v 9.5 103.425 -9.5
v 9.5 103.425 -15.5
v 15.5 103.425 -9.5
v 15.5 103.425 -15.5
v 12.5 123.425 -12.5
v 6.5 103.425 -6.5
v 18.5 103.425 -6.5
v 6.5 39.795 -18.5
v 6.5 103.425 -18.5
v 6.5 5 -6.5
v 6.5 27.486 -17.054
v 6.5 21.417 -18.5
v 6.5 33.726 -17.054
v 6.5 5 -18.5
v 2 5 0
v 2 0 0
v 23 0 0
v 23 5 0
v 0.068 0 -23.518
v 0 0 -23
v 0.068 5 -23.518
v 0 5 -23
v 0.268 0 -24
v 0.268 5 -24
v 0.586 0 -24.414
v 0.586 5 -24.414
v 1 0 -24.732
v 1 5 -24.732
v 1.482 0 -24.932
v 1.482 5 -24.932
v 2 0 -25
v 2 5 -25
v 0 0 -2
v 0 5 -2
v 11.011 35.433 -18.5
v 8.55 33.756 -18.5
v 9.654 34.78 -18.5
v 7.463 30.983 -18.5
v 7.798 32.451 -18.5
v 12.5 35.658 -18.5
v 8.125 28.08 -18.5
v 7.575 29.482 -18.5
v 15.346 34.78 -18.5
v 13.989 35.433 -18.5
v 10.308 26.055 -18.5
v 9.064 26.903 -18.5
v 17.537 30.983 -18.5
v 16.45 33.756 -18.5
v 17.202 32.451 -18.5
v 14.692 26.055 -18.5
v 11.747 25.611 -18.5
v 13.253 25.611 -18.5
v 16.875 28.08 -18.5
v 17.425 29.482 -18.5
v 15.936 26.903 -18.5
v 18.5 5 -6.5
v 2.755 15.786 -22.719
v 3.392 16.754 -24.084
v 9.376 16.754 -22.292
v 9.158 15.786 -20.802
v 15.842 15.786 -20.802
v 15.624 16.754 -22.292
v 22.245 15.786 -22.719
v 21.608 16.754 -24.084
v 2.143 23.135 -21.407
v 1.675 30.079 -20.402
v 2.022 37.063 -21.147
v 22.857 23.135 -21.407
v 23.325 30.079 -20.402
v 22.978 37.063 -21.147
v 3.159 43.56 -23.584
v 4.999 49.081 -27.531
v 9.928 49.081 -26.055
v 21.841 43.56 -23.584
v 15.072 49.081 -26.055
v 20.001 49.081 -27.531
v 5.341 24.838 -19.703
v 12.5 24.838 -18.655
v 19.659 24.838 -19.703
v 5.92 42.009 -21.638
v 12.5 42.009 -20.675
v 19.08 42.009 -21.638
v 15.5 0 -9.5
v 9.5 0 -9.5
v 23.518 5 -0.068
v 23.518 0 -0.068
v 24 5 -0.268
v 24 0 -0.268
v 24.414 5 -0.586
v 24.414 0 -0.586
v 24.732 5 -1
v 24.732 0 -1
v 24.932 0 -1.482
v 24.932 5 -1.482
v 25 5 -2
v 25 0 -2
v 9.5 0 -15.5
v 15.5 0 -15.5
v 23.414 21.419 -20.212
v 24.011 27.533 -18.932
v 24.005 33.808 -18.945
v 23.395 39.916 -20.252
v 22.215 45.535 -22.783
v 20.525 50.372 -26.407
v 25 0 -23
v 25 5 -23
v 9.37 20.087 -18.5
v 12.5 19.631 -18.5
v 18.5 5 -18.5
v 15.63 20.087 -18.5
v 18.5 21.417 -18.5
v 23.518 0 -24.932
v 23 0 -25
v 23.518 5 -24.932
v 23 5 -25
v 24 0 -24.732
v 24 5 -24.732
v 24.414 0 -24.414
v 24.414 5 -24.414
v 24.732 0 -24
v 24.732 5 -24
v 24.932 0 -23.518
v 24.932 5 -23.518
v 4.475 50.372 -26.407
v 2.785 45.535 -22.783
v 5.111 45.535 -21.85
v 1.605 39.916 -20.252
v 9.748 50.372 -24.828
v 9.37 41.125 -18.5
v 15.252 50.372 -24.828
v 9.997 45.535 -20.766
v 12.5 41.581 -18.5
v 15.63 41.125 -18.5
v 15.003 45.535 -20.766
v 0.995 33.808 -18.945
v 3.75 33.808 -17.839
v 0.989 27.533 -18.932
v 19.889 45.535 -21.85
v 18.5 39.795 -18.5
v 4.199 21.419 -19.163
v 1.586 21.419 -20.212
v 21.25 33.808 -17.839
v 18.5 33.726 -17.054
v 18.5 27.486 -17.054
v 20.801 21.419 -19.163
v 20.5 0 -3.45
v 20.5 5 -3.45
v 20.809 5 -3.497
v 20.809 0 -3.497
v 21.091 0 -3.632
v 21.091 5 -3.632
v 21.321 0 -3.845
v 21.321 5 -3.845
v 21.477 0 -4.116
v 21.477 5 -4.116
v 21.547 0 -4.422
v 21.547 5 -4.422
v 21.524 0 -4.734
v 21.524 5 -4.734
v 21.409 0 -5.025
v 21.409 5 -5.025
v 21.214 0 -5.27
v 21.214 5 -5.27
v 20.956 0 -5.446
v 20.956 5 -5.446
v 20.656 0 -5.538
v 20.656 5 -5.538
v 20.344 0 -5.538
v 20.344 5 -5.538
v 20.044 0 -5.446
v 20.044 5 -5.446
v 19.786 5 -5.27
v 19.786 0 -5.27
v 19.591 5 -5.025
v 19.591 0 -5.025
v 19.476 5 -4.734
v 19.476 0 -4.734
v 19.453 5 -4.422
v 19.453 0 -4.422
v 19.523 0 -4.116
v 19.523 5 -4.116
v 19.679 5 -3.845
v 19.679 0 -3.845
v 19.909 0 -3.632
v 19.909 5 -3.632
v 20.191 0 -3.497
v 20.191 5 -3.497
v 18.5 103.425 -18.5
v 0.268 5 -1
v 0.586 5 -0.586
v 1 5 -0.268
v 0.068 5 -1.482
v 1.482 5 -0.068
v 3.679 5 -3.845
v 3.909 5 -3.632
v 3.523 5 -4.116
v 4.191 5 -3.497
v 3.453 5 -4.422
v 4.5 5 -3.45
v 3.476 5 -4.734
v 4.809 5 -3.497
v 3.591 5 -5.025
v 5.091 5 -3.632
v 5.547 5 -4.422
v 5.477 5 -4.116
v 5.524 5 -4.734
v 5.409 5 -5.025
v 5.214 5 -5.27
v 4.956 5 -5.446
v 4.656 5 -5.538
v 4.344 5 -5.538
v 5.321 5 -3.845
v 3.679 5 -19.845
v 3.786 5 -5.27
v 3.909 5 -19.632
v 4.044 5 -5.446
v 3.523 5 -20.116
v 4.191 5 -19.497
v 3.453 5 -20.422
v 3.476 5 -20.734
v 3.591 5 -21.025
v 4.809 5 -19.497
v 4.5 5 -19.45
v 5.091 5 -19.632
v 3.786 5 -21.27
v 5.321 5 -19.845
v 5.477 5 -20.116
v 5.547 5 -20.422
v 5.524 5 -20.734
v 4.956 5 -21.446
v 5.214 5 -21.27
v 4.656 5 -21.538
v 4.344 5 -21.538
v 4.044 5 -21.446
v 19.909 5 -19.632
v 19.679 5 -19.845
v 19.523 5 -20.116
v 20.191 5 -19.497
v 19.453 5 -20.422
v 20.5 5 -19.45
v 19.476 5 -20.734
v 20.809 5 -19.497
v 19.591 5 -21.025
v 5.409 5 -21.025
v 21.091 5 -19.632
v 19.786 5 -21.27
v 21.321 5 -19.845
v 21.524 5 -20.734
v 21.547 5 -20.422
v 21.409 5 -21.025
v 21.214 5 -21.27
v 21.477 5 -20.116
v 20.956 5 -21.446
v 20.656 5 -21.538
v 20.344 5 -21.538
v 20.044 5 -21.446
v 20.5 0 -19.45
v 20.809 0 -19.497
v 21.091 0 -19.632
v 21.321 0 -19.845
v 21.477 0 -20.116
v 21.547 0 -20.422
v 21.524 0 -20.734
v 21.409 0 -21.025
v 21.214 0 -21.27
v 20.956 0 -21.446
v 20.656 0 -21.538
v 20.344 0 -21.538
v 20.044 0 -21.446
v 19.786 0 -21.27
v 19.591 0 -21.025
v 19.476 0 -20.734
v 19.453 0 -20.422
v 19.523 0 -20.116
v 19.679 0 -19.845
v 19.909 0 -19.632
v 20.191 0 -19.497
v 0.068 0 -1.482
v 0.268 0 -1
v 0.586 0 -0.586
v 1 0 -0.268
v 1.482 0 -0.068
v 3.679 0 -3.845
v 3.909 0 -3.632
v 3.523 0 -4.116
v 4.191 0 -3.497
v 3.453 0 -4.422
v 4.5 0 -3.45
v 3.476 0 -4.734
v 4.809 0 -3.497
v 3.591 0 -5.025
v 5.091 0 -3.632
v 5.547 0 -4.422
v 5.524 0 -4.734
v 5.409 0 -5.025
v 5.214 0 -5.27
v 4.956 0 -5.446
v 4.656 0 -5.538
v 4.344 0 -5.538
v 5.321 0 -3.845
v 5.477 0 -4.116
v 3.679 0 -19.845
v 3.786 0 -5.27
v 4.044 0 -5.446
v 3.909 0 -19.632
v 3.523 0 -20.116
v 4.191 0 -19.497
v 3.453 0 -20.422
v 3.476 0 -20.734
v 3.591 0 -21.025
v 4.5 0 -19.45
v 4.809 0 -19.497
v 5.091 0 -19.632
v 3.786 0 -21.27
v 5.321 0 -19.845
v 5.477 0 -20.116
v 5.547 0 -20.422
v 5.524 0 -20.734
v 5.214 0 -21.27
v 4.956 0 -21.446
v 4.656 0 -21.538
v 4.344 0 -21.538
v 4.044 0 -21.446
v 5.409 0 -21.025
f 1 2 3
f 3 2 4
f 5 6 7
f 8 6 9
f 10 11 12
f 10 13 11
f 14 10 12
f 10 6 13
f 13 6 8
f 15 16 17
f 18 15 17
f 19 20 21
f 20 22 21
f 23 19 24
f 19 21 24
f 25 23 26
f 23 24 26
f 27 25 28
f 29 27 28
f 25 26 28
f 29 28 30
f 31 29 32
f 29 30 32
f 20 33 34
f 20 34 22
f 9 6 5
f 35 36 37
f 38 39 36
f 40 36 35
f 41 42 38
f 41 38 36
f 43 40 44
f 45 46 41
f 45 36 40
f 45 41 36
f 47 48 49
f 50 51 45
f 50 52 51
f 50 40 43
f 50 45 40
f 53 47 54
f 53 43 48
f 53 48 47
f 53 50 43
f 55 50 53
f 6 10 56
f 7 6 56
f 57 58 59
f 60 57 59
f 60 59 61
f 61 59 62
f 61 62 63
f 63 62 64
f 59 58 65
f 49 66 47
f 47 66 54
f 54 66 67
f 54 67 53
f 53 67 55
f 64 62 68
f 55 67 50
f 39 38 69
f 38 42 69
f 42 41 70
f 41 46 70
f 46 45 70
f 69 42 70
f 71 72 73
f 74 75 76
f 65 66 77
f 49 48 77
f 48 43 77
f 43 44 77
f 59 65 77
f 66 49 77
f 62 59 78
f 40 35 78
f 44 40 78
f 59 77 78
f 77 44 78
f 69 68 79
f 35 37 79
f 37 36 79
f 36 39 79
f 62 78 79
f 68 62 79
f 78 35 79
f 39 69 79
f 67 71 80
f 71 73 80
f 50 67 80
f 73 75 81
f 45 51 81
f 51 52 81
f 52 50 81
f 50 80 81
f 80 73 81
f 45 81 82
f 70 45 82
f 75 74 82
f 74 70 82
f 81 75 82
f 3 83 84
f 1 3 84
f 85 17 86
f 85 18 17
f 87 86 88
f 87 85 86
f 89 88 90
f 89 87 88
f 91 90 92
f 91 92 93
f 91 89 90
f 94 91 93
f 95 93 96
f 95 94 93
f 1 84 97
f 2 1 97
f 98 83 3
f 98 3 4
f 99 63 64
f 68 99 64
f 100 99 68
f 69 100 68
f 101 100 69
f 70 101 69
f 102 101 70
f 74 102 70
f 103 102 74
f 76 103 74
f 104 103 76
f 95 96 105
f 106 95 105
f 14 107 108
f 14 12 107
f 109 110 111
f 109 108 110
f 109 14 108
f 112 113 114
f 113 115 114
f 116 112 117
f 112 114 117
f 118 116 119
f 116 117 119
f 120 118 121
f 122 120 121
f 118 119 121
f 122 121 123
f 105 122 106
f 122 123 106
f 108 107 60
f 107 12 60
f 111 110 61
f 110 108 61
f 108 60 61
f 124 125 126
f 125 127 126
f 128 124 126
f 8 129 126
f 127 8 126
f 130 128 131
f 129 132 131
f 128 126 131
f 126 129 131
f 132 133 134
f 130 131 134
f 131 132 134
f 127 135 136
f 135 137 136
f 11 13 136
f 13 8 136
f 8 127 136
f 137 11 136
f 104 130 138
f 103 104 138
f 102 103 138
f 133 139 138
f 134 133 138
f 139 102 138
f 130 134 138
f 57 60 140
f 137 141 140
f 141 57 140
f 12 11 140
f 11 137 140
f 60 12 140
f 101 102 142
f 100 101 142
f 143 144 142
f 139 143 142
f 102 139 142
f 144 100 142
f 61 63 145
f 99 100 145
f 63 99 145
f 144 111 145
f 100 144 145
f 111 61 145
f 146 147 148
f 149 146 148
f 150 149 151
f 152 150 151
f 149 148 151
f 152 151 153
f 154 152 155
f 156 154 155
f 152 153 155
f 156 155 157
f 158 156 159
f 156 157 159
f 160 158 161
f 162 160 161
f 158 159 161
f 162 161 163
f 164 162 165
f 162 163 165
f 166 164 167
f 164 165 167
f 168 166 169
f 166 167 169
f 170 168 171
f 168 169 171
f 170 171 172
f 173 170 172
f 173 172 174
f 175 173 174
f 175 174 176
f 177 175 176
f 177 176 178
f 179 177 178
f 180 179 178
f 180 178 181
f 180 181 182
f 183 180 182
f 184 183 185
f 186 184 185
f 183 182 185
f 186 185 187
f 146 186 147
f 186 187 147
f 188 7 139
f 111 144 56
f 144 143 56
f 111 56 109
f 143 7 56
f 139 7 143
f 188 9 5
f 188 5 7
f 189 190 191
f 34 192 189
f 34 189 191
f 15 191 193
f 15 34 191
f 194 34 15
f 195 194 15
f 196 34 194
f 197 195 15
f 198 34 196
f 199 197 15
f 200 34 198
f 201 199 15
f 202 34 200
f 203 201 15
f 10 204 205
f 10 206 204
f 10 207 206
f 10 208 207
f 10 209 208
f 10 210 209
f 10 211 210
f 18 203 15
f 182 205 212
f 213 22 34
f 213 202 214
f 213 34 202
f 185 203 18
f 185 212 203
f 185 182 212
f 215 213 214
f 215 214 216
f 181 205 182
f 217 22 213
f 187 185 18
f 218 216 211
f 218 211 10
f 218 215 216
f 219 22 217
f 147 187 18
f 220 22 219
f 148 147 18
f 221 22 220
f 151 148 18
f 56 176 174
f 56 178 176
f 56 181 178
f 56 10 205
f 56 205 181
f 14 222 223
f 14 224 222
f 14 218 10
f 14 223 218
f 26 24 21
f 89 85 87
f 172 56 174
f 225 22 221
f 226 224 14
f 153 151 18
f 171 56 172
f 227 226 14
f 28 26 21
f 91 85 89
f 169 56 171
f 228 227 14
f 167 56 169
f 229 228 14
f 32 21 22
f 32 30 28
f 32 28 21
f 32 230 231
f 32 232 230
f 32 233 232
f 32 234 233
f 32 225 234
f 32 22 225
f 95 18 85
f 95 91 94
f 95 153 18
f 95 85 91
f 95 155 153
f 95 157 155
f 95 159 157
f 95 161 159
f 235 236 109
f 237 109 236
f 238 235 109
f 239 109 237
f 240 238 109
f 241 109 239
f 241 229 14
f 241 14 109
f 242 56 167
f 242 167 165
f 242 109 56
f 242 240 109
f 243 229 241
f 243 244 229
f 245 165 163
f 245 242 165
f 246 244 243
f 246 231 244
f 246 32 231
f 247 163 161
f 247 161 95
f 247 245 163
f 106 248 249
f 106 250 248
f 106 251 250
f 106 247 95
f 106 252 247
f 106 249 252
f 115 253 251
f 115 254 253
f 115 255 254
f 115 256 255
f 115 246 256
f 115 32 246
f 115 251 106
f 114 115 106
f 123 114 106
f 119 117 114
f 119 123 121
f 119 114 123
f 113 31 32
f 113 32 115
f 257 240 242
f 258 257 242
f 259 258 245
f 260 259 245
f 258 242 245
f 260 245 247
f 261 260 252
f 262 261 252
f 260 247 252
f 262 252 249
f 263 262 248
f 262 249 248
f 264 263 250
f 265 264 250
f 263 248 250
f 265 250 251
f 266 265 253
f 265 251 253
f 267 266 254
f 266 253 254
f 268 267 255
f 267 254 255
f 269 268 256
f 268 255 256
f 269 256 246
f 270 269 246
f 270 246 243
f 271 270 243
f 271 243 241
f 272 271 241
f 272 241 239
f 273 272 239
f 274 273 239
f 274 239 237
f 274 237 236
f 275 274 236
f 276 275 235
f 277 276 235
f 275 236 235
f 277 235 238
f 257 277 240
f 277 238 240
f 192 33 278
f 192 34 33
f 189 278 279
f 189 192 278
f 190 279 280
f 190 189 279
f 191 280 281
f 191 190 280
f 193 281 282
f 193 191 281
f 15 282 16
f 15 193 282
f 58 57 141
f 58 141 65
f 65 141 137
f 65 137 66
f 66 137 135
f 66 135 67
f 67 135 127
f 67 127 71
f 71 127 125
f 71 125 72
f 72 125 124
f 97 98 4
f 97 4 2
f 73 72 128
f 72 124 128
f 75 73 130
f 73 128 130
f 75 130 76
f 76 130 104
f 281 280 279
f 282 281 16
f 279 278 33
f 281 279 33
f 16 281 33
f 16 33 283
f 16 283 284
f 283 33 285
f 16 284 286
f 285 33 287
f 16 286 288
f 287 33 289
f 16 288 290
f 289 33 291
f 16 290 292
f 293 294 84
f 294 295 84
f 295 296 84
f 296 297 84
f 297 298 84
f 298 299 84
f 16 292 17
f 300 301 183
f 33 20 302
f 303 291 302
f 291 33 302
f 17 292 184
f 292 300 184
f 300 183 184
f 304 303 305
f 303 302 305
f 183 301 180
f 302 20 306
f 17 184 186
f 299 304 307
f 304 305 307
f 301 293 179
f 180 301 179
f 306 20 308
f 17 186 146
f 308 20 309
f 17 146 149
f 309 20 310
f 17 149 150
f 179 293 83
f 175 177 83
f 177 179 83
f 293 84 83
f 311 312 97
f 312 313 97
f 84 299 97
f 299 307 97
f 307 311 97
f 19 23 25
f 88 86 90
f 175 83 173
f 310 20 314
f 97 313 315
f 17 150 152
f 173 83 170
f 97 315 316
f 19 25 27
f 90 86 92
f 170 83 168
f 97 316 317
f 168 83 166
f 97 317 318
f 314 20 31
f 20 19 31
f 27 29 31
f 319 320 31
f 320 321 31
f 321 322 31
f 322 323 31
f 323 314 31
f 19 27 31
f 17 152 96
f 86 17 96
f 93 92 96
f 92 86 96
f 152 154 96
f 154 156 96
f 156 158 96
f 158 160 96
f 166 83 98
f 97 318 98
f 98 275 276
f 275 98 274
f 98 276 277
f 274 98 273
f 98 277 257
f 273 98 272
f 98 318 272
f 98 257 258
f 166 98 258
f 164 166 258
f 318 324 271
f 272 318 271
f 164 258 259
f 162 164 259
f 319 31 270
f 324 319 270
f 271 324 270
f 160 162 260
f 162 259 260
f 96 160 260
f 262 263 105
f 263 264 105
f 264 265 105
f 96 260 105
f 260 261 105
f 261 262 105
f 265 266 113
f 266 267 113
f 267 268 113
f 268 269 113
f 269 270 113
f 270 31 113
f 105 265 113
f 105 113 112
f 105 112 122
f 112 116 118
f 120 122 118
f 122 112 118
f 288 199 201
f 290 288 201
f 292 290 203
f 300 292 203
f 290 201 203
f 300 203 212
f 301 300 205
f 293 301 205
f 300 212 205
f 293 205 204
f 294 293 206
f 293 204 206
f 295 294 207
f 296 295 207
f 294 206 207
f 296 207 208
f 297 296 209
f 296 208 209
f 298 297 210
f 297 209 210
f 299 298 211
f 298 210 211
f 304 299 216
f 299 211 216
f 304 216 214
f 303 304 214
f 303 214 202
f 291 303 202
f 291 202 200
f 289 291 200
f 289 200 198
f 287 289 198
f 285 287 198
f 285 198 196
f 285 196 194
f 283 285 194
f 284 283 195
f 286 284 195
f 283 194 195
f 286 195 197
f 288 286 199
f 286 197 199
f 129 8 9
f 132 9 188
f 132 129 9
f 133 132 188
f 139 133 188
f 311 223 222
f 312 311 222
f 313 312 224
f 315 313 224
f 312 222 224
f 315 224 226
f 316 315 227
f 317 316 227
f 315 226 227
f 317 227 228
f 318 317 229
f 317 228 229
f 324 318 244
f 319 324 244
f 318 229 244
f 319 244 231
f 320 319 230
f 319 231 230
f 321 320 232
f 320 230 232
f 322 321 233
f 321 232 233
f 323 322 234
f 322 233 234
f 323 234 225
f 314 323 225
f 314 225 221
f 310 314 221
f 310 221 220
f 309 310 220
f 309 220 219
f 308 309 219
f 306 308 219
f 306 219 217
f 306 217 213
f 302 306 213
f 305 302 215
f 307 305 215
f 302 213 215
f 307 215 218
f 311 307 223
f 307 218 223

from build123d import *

# Parameters (mm, degrees)
SKETCH1_W                = 25
SKETCH1_H                = 25
BOSS_EXTRUDE1_DEPTH      = 5
SKETCH2_R                = 1.05
CUT_EXTRUDE1_DEPTH       = 5
FILLET1_R                = 2
SKETCH3_W                = 12
SKETCH3_H                = 12
SKETCH3_W_2              = 6
SKETCH3_H_2              = 6
BOSS_EXTRUDE2_DEPTH      = 98.425
SKETCH4_W                = 6
SKETCH4_H                = 6
CUT_EXTRUDE2_DEPTH       = 10
SKETCH5_W                = 12
SKETCH5_H                = 12
BOSS_EXTRUDE3_DEPTH      = 20
CUT_EXTRUDE3_DEPTH       = 20
CUT_EXTRUDE4_DEPTH       = 20
REVOLVE1_ANGLE           = 25
REVOLVE1_OTHER_WAY_ANGLE = 25


with BuildPart() as part:
    # Sketch1 → Boss-Extrude1 (new body)
    with BuildSketch(Plane(origin=(0, 0, 0), x_dir=(1, 0, 0), z_dir=(0, 1, 0))):
        with Locations((12.5, 12.5)):
            Rectangle(SKETCH1_W, SKETCH1_H)
    extrude(amount=BOSS_EXTRUDE1_DEPTH)

    # Sketch2 → Cut-Extrude1 (cut)
    with BuildSketch(Plane(origin=(0, 5, 0), x_dir=(1, 0, 0), z_dir=(0, 1, 0))):
        with Locations(Location((4.5, 4.5, 0), (0, 0, 270))):
            Circle(SKETCH2_R)
        with Locations(Location((20.5, 4.5, 0), (0, 0, 270))):
            Circle(SKETCH2_R)
        with Locations(Location((20.5, 20.5, 0), (0, 0, 270))):
            Circle(SKETCH2_R)
        with Locations(Location((4.5, 20.5, 0), (0, 0, 270))):
            Circle(SKETCH2_R)
    extrude(amount=-CUT_EXTRUDE1_DEPTH, mode=Mode.SUBTRACT)

    # Fillet1
    fillet1_edges = [part.edges().sort_by_distance(p)[0] for p in [
        (0, 2.5, -25),
        (25, 2.5, -25),
        (25, 2.5, 0),
        (0, 2.5, 0),
    ]]
    fillet(fillet1_edges, radius=FILLET1_R)

    # Sketch3 → Boss-Extrude2 (add)
    with BuildSketch(Plane(origin=(0, 5, 0), x_dir=(1, 0, 0), z_dir=(0, 1, 0))):
        with Locations((12.5, 12.5)):
            Rectangle(SKETCH3_W, SKETCH3_H)
        with Locations((12.5, 12.5)):
            Rectangle(SKETCH3_W_2, SKETCH3_H_2, mode=Mode.SUBTRACT)
    extrude(amount=BOSS_EXTRUDE2_DEPTH)

    # Sketch4 → Cut-Extrude2 (cut)
    with BuildSketch(Plane(origin=(0, 0, 0), x_dir=(-1, 0, 0), z_dir=(0, -1, 0))):
        with Locations((-12.5, 12.5)):
            Rectangle(SKETCH4_W, SKETCH4_H)
    extrude(amount=-CUT_EXTRUDE2_DEPTH, mode=Mode.SUBTRACT)

    # Sketch5 → Boss-Extrude3 (add)
    with BuildSketch(Plane(origin=(0, 103.425, 0), x_dir=(1, 0, 0), z_dir=(0, 1, 0))):
        with Locations((12.5, 12.5)):
            Rectangle(SKETCH5_W, SKETCH5_H)
    extrude(amount=BOSS_EXTRUDE3_DEPTH)

    # Sketch6 → Cut-Extrude3 (cut)
    with BuildSketch(Plane.XY.offset(-6.5)):
        Polygon((18.5, 123.425), (12.5, 123.425), (18.5, 103.425), align=None)
        Polygon((6.5, 103.425), (12.5, 123.425), (6.5, 123.425), align=None)
    extrude(amount=-CUT_EXTRUDE3_DEPTH, mode=Mode.SUBTRACT)

    # Sketch7 → Cut-Extrude4 (cut)
    with BuildSketch(Plane.ZY.offset(-6.5)):
        Polygon((-6.5, 123.425), (-6.5, 103.425), (-12.5, 123.425), align=None)
        Polygon((-18.5, 123.425), (-18.5, 103.425), (-12.5, 123.425), align=None)
    extrude(amount=-CUT_EXTRUDE4_DEPTH, mode=Mode.SUBTRACT)

    # Sketch8 → Revolve1 (revolve)
    with BuildSketch(Plane(origin=(12.5, 0, 0), x_dir=(0, 0, -1), z_dir=(1, 0, 0))):
        with BuildLine():
            ThreePointArc((24.627603923, 50.372343644), (16.394708904, 33.808356072), (20.558863125, 15.785979305))
            Line((20.558863125, 15.785979305), (22.064703847, 16.753815466))
            ThreePointArc((22.064703847, 16.753815466), (18.172495187, 33.599217247), (25.867730183, 49.081471856))
            Line((25.867730183, 49.081471856), (24.627603923, 50.372343644))
        make_face()
    revolve(axis=Axis((12.5, 54.79169199, -43.616981759), (0, -1, 0)), revolution_arc=REVOLVE1_ANGLE)

    # Sketch8 → Revolve1 other way (revolve)
    with BuildSketch(Plane(origin=(12.5, 0, 0), x_dir=(0, 0, -1), z_dir=(1, 0, 0))):
        with BuildLine():
            ThreePointArc((24.627603923, 50.372343644), (16.394708904, 33.808356072), (20.558863125, 15.785979305))
            Line((20.558863125, 15.785979305), (22.064703847, 16.753815466))
            ThreePointArc((22.064703847, 16.753815466), (18.172495187, 33.599217247), (25.867730183, 49.081471856))
            Line((25.867730183, 49.081471856), (24.627603923, 50.372343644))
        make_face()
    revolve(axis=Axis((12.5, 54.79169199, -43.616981759), (0, 1, 0)), revolution_arc=REVOLVE1_OTHER_WAY_ANGLE)


solid = part.part
